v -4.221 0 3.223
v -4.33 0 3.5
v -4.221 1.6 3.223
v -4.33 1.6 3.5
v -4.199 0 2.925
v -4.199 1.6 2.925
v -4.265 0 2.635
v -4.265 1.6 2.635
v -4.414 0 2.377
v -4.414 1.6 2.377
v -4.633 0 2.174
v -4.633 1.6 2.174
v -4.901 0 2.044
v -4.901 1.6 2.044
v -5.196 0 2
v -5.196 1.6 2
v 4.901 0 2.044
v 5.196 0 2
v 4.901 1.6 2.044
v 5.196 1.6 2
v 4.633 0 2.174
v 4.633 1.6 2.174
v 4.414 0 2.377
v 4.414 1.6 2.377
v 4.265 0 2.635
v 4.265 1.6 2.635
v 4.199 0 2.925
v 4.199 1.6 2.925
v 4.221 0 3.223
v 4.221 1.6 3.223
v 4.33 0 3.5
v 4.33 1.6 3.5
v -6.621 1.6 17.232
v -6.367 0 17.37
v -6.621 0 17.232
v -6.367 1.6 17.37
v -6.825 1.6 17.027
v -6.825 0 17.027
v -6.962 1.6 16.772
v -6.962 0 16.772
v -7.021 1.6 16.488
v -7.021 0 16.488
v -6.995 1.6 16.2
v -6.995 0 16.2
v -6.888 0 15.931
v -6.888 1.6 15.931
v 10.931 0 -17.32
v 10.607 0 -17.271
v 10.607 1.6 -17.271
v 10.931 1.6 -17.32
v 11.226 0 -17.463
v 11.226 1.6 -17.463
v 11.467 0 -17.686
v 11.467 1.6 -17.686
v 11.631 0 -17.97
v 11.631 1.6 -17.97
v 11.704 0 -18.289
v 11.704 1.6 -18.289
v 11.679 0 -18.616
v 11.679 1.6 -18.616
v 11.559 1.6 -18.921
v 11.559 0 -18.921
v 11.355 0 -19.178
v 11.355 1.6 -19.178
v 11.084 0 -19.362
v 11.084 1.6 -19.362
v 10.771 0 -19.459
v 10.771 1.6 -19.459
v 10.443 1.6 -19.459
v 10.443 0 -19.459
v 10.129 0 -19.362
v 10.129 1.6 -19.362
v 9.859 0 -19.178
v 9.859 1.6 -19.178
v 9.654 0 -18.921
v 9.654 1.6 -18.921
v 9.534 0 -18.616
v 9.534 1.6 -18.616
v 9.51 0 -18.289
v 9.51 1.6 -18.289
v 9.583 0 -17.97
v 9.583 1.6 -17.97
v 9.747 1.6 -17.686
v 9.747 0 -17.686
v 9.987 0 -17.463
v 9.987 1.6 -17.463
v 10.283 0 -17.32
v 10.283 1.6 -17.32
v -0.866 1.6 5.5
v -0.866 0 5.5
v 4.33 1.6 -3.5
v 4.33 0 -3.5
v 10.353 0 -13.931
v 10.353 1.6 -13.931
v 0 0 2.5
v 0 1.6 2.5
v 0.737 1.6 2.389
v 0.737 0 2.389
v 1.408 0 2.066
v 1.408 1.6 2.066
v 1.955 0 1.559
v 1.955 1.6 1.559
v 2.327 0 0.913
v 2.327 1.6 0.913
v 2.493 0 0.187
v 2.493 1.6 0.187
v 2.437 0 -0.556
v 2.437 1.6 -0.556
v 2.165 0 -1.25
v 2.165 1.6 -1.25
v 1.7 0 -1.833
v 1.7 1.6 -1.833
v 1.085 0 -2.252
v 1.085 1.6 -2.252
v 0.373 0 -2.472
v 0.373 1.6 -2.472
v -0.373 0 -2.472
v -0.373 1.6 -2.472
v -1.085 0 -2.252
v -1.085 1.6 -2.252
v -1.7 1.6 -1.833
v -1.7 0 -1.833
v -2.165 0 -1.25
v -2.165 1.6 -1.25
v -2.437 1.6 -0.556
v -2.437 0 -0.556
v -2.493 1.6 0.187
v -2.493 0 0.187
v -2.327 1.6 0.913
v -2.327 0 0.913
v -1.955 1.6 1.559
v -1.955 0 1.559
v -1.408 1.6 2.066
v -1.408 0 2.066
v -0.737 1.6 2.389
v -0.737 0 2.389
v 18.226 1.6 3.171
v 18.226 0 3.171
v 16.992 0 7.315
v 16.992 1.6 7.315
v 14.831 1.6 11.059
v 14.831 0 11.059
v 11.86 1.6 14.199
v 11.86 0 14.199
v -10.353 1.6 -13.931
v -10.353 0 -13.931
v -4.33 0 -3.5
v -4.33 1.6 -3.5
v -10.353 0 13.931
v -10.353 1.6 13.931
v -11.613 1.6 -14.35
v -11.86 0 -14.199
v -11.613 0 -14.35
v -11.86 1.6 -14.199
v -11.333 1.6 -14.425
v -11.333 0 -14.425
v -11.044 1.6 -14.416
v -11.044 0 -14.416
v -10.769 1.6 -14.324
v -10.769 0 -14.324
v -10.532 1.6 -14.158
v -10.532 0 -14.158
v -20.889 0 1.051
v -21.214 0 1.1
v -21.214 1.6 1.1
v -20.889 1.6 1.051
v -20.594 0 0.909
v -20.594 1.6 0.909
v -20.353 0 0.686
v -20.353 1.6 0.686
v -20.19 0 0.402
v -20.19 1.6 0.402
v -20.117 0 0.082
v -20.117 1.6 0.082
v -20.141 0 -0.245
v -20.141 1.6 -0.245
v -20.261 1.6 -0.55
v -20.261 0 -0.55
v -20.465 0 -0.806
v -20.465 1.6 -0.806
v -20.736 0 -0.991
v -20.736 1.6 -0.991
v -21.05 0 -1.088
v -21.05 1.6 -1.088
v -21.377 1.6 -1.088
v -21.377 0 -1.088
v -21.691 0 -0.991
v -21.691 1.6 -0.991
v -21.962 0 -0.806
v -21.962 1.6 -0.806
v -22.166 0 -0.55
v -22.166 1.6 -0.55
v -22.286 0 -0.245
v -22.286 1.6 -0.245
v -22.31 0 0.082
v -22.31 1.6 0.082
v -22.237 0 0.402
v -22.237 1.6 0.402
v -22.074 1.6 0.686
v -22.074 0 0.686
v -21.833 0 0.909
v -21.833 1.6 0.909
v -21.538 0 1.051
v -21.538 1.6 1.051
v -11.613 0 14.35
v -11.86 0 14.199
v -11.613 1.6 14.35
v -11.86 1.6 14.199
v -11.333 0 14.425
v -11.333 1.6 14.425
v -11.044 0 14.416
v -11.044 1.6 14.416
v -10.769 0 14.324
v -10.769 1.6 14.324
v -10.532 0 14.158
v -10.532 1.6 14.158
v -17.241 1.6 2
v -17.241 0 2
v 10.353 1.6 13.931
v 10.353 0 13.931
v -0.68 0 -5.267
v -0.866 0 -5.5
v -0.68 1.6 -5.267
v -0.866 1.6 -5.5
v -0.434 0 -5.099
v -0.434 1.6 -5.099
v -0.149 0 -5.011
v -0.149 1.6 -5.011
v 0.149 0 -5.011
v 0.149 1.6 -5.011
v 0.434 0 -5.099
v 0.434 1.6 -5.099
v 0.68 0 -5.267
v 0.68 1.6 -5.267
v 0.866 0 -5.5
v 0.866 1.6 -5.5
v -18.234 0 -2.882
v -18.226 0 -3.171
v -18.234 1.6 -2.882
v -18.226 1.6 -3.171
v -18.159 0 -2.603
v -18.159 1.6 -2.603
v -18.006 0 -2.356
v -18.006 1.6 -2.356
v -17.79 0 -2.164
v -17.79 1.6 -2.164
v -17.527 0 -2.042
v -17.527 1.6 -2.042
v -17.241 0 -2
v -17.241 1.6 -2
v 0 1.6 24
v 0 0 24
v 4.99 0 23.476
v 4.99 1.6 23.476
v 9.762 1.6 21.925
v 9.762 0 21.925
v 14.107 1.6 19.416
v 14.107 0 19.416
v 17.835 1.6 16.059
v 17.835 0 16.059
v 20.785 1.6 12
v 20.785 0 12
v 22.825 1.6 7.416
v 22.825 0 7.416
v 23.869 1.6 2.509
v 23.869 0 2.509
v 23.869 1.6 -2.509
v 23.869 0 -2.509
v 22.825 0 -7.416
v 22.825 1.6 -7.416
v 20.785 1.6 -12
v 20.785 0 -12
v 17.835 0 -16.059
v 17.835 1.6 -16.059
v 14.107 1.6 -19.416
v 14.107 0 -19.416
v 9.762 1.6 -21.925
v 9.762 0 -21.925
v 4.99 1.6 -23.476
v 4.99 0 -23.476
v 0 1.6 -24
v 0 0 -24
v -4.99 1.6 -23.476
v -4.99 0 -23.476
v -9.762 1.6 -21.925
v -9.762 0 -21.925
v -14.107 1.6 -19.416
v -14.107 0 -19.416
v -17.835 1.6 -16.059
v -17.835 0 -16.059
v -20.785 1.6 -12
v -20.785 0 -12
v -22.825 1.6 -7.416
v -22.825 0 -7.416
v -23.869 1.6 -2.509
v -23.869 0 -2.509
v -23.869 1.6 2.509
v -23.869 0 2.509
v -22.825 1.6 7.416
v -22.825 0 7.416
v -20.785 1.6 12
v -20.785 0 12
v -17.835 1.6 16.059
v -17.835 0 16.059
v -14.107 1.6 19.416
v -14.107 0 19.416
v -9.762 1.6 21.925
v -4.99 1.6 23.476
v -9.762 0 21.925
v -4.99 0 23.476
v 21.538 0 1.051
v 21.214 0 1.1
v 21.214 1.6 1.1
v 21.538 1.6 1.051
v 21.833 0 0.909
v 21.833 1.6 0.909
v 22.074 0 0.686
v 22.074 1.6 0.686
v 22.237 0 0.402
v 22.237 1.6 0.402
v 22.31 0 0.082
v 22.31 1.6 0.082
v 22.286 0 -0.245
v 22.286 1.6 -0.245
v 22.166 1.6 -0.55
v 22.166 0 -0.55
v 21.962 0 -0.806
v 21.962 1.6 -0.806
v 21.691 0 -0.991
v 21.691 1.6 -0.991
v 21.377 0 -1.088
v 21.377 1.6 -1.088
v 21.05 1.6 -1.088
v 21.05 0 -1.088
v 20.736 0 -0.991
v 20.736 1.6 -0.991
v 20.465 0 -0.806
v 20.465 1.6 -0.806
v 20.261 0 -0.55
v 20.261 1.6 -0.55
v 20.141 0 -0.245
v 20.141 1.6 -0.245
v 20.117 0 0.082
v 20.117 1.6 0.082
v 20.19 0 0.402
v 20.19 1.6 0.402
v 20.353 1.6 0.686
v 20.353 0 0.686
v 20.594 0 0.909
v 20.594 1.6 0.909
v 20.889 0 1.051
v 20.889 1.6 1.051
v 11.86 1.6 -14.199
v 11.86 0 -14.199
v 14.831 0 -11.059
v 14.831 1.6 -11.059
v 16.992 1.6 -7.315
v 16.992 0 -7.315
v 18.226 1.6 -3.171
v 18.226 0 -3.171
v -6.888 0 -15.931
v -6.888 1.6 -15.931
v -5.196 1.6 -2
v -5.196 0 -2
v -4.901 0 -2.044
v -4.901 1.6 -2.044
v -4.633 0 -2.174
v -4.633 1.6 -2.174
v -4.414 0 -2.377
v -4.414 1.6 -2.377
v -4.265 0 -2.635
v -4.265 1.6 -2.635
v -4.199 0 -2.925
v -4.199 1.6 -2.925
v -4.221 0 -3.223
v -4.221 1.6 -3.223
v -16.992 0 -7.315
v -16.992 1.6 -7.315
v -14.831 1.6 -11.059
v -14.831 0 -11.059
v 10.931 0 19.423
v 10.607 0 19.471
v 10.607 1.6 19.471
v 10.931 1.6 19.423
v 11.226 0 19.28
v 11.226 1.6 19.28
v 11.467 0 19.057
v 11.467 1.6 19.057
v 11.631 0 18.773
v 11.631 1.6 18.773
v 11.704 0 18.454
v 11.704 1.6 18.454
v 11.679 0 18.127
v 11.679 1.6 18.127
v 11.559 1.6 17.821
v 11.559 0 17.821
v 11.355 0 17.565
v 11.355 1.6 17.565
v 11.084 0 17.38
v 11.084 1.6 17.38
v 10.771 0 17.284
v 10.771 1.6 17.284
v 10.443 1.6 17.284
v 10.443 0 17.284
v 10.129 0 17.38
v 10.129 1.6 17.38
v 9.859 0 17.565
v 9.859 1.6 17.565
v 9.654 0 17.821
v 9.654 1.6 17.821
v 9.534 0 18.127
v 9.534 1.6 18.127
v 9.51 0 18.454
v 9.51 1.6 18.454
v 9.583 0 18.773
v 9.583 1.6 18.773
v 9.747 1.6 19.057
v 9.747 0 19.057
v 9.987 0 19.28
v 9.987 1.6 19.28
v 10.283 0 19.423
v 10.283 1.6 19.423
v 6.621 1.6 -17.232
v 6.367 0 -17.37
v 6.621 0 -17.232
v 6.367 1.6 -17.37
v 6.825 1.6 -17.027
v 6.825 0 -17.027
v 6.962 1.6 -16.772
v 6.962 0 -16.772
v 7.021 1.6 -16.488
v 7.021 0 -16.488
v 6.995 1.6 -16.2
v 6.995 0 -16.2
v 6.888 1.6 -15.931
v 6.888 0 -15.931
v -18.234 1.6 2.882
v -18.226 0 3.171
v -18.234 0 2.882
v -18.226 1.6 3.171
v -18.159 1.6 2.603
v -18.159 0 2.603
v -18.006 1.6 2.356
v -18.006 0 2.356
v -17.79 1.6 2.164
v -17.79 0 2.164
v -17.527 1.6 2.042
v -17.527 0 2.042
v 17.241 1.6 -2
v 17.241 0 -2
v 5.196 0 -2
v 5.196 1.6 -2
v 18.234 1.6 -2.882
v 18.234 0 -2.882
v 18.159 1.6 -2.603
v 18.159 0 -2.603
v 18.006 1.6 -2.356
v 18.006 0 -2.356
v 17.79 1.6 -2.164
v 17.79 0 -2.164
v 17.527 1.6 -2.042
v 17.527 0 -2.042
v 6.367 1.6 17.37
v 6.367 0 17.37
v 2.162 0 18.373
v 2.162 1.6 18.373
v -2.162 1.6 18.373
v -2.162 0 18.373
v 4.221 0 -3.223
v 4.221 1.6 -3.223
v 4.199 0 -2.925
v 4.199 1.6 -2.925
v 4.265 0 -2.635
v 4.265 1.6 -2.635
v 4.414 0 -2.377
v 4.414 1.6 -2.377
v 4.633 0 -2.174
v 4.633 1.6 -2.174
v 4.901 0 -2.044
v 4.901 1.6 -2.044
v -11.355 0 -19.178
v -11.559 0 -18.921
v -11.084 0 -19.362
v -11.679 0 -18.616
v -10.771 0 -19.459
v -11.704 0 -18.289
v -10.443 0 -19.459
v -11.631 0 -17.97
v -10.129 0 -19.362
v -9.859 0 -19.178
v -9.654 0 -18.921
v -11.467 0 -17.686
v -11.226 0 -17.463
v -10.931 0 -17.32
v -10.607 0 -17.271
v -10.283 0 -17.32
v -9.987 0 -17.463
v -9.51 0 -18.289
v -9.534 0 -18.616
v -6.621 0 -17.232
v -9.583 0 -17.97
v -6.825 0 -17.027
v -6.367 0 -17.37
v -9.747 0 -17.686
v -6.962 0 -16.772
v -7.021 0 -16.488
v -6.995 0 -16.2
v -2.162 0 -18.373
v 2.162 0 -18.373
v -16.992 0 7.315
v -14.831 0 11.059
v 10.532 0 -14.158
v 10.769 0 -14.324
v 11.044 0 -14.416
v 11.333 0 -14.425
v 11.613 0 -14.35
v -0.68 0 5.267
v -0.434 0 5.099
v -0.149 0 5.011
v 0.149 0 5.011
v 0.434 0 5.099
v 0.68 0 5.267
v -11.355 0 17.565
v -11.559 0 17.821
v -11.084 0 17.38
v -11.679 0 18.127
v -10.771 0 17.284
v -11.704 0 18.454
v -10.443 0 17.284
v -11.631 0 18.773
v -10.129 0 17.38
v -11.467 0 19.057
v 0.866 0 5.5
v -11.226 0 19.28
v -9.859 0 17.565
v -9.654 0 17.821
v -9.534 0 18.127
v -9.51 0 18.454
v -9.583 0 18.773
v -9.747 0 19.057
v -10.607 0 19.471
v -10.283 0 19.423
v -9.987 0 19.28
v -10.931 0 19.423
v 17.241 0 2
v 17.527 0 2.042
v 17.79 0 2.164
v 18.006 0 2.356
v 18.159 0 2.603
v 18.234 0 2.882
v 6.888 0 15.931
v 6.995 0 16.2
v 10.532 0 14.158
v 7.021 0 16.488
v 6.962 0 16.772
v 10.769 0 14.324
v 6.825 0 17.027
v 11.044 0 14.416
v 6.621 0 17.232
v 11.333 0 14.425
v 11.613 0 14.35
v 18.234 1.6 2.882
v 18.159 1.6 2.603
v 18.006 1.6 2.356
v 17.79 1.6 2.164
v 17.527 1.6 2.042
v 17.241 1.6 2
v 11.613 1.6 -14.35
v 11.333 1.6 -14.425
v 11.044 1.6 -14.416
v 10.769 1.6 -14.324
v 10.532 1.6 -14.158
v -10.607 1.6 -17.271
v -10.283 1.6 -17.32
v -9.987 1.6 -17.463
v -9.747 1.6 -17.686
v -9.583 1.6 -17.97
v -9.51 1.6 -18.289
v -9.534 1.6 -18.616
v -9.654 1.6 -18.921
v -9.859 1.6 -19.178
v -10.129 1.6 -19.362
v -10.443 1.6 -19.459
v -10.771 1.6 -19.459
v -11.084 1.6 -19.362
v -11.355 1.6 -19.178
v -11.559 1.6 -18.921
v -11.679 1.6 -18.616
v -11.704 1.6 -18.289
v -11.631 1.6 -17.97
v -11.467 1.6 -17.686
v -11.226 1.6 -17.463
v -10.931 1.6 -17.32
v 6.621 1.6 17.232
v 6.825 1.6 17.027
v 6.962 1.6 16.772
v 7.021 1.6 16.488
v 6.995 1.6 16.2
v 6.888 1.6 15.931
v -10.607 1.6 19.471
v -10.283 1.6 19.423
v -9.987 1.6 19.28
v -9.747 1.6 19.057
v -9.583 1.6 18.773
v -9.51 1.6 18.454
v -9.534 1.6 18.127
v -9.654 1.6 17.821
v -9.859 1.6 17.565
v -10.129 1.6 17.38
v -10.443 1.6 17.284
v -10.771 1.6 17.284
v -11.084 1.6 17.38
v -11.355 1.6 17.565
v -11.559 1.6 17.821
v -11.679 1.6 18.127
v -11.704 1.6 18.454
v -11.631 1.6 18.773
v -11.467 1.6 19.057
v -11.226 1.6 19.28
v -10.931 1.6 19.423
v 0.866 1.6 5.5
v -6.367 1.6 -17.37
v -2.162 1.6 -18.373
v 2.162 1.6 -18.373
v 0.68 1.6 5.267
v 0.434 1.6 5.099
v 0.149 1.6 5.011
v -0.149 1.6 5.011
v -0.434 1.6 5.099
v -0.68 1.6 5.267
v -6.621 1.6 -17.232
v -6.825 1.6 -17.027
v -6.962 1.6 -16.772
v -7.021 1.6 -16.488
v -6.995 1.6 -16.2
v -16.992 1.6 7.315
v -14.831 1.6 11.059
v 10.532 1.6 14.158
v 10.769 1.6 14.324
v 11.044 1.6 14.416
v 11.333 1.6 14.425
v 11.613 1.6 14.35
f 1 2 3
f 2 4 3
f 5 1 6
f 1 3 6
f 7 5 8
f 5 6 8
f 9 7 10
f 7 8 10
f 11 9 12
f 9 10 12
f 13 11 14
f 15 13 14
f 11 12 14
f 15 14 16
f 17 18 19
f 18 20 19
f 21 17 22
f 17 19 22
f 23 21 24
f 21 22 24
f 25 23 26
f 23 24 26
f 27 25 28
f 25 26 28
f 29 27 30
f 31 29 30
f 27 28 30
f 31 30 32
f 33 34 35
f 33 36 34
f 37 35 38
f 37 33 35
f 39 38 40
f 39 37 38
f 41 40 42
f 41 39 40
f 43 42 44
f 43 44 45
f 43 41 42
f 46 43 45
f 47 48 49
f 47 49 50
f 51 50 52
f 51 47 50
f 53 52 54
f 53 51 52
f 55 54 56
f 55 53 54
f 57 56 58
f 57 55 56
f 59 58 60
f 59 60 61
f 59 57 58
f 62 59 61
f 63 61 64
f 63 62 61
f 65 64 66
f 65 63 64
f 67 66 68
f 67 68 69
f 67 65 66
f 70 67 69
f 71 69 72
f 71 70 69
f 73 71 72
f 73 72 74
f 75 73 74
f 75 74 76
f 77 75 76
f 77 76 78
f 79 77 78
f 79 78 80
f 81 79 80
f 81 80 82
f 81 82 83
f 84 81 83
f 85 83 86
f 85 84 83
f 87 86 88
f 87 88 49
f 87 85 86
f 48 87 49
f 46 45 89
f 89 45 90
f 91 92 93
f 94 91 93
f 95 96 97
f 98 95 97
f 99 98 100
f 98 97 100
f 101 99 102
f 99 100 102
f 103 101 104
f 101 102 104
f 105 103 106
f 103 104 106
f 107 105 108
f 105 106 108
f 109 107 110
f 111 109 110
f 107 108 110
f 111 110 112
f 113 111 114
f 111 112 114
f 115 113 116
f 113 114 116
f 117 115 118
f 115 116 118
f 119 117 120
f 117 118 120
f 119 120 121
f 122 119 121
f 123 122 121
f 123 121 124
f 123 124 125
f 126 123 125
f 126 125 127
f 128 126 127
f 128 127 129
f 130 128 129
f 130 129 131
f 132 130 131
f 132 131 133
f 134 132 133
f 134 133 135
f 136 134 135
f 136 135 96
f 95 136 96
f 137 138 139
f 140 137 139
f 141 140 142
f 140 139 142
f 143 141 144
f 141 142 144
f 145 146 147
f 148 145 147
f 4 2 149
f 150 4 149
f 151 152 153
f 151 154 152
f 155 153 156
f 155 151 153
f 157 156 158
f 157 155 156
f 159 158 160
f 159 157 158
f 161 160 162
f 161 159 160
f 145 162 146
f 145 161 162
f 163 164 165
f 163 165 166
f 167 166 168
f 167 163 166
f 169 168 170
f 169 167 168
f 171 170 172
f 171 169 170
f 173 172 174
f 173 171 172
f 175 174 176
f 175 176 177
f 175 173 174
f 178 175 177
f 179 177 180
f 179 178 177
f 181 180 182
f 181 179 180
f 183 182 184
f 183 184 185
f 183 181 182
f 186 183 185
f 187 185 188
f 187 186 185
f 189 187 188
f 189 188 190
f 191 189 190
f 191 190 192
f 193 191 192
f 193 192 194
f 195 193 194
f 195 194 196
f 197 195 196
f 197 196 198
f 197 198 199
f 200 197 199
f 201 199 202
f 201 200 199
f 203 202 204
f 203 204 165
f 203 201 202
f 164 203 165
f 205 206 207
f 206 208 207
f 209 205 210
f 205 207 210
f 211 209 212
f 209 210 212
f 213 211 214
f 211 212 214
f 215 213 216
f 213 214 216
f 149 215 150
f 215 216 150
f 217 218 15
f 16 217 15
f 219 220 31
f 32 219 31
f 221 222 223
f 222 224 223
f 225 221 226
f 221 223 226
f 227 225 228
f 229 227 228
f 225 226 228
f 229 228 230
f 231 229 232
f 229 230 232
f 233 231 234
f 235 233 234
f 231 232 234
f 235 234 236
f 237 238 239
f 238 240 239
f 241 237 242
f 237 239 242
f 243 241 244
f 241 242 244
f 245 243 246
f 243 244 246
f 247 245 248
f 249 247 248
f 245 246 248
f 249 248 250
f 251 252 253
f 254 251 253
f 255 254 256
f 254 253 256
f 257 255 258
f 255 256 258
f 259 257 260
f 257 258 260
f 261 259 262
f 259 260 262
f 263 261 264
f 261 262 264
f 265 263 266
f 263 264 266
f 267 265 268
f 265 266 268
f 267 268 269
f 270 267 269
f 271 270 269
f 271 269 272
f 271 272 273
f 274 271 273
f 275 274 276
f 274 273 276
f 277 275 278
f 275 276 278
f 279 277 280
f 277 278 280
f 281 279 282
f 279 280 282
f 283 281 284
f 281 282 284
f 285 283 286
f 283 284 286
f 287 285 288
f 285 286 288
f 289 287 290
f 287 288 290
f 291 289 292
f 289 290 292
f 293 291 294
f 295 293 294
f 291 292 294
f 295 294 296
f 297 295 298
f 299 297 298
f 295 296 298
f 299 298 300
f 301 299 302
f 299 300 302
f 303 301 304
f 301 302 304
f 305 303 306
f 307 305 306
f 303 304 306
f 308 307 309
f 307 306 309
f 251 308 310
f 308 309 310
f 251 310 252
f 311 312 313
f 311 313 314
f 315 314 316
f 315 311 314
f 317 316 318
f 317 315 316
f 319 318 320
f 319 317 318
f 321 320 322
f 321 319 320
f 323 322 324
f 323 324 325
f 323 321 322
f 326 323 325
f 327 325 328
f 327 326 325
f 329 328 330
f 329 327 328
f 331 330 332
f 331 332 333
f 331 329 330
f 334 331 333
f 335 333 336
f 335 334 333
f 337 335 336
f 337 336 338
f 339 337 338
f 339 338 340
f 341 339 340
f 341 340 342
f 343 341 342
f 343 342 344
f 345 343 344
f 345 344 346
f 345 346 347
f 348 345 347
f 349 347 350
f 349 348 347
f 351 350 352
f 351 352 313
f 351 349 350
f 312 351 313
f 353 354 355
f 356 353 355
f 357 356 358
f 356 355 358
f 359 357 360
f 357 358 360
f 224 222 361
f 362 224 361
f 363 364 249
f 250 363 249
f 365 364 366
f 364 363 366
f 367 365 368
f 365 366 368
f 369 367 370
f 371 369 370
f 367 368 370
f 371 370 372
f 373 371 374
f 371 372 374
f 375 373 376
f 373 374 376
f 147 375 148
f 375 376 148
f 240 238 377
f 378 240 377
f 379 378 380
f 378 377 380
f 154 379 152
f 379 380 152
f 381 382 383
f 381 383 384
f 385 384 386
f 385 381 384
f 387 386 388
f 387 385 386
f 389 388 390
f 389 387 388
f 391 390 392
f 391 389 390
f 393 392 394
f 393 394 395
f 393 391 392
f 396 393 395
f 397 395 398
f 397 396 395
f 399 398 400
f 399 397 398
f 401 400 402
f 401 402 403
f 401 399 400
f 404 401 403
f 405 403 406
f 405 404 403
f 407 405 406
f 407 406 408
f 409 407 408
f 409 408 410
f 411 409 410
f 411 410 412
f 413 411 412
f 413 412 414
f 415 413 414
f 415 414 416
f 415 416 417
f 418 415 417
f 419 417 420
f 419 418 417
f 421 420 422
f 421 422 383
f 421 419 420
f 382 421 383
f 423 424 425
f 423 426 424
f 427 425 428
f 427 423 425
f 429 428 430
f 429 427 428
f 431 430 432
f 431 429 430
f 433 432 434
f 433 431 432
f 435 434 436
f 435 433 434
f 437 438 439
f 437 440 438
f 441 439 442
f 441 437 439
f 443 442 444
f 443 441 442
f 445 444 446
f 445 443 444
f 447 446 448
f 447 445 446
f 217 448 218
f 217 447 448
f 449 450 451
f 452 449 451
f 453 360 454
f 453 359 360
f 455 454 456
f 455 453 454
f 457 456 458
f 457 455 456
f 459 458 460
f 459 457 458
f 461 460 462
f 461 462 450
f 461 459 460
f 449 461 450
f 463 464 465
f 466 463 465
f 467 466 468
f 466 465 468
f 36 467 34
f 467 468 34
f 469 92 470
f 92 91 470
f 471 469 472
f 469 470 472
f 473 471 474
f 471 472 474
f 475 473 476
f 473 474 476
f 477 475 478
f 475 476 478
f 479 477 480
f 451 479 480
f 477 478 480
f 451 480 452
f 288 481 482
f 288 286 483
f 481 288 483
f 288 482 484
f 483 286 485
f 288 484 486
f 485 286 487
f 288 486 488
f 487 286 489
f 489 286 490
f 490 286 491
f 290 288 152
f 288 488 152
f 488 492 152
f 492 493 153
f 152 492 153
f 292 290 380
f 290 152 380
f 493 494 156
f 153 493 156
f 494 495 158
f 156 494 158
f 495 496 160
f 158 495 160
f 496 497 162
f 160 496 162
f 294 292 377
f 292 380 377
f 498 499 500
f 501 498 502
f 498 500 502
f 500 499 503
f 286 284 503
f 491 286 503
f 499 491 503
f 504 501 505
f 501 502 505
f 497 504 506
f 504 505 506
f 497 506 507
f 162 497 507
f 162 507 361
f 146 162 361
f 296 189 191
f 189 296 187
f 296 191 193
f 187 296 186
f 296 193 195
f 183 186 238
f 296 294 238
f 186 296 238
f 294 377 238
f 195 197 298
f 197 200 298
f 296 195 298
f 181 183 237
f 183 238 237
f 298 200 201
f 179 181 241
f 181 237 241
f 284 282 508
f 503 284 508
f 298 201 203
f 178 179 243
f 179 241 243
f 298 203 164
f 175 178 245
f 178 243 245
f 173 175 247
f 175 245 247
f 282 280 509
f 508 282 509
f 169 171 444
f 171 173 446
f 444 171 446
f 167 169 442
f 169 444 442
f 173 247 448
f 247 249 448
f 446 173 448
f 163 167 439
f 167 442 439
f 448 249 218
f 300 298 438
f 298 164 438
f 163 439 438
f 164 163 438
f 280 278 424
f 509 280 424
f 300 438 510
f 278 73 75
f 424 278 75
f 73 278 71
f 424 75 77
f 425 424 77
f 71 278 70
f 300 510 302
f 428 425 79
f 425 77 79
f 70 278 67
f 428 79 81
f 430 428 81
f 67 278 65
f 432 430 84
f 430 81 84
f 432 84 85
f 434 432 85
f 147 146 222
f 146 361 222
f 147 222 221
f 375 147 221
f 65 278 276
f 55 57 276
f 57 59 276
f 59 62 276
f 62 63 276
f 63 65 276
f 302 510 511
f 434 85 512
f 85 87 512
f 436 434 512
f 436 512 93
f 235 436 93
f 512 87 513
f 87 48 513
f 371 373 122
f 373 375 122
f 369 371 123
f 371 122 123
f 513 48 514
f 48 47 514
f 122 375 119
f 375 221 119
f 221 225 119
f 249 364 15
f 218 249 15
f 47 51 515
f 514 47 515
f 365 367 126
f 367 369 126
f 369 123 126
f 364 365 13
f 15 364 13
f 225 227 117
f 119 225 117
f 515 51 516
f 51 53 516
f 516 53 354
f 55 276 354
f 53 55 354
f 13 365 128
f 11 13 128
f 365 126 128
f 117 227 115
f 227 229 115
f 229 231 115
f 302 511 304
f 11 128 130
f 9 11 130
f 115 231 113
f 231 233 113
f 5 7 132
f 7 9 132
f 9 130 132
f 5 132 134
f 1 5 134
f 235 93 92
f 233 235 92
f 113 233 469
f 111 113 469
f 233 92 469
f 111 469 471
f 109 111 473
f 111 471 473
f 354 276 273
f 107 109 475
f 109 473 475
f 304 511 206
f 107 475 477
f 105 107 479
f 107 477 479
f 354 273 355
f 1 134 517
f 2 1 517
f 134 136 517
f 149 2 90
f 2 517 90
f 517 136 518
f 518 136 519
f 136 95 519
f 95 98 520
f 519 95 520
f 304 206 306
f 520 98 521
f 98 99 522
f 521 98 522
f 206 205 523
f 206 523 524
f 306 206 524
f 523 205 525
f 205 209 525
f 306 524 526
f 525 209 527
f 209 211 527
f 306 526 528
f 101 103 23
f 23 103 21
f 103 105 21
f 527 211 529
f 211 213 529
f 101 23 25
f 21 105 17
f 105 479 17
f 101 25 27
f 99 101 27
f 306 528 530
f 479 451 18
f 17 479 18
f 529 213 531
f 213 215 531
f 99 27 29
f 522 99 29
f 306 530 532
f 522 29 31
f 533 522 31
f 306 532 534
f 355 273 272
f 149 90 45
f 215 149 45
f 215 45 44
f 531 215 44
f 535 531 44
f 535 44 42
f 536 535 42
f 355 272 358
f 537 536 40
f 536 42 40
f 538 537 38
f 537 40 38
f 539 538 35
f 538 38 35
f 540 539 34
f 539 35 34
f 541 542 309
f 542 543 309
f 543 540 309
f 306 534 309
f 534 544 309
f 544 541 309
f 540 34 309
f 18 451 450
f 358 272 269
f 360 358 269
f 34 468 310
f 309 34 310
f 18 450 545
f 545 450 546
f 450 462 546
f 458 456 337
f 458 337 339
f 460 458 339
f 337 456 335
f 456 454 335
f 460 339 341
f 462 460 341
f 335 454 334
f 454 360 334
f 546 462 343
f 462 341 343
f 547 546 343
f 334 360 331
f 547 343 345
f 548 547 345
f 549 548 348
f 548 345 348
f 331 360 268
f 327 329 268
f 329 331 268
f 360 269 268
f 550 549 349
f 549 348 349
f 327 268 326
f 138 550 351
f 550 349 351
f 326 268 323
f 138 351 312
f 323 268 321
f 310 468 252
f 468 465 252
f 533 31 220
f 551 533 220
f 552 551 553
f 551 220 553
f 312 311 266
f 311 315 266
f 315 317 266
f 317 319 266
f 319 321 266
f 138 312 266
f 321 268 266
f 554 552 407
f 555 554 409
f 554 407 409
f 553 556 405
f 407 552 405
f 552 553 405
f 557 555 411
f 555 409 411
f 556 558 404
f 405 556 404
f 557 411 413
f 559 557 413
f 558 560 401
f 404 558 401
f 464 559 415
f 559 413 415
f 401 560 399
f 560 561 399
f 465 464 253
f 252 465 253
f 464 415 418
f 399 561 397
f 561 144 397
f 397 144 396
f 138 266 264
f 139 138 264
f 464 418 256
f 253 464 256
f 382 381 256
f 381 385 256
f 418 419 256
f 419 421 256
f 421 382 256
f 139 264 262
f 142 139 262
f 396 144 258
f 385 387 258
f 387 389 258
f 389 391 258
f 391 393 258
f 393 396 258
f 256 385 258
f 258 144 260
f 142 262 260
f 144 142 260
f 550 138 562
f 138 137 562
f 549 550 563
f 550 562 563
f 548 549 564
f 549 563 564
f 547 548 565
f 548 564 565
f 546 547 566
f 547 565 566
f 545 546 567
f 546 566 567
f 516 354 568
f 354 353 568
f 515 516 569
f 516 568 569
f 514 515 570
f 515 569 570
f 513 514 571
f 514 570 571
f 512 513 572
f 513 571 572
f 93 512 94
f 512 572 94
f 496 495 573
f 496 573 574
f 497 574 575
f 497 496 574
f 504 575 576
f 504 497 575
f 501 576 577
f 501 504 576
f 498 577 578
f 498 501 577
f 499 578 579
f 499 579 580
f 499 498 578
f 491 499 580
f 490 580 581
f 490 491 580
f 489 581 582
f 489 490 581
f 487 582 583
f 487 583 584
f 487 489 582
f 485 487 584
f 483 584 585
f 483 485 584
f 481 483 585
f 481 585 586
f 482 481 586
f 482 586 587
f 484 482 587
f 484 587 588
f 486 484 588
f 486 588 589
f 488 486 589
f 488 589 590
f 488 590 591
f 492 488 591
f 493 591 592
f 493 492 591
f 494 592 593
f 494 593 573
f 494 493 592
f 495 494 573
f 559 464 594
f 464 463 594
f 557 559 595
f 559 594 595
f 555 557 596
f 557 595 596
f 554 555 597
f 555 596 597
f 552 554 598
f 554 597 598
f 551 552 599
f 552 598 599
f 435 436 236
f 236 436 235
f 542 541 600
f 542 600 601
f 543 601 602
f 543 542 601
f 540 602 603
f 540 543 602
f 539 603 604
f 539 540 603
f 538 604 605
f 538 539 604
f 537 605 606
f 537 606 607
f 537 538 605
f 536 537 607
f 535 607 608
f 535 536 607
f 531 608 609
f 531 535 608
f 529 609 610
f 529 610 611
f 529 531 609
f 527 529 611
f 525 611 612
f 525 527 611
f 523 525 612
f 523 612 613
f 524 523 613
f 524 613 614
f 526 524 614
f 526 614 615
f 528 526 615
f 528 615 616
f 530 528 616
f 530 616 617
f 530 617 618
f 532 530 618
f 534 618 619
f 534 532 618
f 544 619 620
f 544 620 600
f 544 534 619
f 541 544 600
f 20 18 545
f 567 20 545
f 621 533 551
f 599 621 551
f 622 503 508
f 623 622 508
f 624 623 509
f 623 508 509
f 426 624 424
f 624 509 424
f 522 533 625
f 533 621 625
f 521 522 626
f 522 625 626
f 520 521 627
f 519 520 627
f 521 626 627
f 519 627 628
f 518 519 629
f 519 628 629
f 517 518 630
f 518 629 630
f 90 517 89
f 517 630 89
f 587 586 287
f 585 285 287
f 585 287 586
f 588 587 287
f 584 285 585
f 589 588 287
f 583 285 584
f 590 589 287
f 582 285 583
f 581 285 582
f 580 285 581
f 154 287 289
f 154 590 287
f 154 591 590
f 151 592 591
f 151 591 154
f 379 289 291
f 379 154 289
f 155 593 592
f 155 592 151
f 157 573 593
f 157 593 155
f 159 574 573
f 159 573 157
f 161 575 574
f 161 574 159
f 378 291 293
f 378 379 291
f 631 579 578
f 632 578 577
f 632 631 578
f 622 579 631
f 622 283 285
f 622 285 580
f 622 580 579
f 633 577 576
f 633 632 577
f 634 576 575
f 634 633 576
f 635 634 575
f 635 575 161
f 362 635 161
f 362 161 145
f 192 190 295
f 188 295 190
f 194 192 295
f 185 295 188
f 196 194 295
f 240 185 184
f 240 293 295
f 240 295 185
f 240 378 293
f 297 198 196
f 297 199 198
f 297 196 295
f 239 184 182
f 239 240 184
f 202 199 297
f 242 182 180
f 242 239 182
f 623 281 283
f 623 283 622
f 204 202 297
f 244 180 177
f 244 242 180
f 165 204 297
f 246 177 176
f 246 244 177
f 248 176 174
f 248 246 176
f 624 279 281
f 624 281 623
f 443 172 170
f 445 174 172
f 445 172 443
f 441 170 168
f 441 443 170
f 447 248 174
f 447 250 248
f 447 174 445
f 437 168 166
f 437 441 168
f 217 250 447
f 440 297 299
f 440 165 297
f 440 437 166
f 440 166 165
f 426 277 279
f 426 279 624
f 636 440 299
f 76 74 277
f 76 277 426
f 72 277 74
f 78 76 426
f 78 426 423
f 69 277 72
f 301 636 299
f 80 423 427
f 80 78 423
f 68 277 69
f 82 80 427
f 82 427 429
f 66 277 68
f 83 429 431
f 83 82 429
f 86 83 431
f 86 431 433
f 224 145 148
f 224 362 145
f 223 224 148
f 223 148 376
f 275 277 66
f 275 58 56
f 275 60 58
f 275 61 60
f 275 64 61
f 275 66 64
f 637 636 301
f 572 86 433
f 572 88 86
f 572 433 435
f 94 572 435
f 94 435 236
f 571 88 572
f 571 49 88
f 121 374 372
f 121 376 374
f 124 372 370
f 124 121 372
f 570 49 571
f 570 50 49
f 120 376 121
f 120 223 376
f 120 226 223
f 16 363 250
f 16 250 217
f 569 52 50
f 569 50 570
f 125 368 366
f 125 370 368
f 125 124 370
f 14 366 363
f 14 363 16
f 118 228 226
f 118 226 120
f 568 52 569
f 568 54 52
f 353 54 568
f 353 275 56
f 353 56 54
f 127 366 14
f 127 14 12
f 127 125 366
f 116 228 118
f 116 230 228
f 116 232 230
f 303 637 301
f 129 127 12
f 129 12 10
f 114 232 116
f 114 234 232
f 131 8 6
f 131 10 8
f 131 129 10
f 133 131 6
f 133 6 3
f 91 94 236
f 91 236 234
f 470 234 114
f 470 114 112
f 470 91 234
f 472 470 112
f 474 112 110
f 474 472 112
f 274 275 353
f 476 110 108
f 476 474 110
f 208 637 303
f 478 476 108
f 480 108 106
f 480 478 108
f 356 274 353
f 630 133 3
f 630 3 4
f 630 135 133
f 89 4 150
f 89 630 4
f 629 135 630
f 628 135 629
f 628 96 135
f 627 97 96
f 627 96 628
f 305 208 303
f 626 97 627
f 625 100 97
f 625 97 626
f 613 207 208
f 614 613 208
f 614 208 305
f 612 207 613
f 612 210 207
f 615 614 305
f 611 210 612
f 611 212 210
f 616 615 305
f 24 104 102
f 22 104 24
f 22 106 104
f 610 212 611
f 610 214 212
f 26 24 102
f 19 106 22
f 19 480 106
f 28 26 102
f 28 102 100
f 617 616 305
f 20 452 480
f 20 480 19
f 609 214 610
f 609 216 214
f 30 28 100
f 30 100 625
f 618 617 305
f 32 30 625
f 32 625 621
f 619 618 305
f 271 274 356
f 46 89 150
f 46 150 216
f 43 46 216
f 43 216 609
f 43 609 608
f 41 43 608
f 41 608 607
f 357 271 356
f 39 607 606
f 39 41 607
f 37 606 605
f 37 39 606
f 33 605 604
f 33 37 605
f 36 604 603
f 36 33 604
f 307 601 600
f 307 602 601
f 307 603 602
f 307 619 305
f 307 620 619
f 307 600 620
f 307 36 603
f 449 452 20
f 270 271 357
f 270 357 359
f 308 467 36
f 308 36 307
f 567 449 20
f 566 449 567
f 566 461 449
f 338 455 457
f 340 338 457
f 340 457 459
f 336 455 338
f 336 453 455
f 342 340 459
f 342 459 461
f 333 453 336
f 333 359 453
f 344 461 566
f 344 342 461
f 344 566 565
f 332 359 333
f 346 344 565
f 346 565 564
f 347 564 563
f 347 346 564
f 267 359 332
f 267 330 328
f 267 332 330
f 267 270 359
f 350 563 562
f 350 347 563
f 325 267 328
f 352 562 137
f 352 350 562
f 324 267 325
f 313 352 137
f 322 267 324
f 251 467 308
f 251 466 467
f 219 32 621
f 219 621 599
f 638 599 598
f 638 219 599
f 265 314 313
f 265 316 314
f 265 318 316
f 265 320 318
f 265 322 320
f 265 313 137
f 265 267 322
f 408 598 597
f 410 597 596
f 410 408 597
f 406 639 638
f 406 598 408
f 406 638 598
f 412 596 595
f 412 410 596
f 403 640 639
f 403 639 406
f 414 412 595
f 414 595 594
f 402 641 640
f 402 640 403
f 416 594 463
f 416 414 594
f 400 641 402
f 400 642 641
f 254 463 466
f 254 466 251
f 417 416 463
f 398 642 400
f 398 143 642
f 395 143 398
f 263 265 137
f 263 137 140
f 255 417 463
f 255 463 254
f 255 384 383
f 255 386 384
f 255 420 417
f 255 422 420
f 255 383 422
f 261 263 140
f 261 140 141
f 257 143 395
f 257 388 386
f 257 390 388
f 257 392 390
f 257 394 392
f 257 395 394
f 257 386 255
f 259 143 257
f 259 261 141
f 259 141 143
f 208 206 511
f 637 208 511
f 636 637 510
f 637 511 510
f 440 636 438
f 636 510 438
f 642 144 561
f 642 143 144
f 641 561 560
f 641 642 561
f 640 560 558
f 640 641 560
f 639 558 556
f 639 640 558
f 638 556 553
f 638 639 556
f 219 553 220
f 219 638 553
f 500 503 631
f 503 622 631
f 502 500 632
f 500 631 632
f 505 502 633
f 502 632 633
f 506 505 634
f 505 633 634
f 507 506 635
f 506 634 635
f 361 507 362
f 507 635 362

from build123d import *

# Parameters (mm, degrees)
SKETCH1_R           = 24
SKETCH1_R_2         = 1.1
BOSS_EXTRUDE1_DEPTH = 1.6
FILLET1_R           = 1
SKETCH2_R           = 2.5
CUT_EXTRUDE1_DEPTH  = 34.978816931


with BuildPart() as part:
    # Sketch1 → Boss-Extrude1 (new body)
    with BuildSketch(Plane(origin=(0, 0, 0), x_dir=(1, 0, 0), z_dir=(0, 1, 0))):
        with Locations(Location((0, 0, 0), (0, 0, 270))):
            Circle(SKETCH1_R)
        with BuildLine():
            Line((-7.463736271, -16.927570436), (0, -4))
            Line((0, -4), (7.463736271, -16.927570436))
            ThreePointArc((7.463736271, -16.927570436), (0, -18.5), (-7.463736271, -16.927570436))
        make_face(mode=Mode.SUBTRACT)
        with BuildLine():
            Line((10.927837886, -14.927570436), (3.464101615, -2))
            Line((3.464101615, -2), (18.391574158, -2))
            ThreePointArc((18.391574158, -2), (16.02146997, -9.25), (10.927837886, -14.927570436))
        make_face(mode=Mode.SUBTRACT)
        with BuildLine():
            Line((18.391574158, 2), (3.464101615, 2))
            Line((3.464101615, 2), (10.927837886, 14.927570436))
            ThreePointArc((10.927837886, 14.927570436), (16.02146997, 9.25), (18.391574158, 2))
        make_face(mode=Mode.SUBTRACT)
        with BuildLine():
            Line((7.463736271, 16.927570436), (0, 4))
            Line((0, 4), (-7.463736271, 16.927570436))
            ThreePointArc((-7.463736271, 16.927570436), (0, 18.5), (7.463736271, 16.927570436))
        make_face(mode=Mode.SUBTRACT)
        with BuildLine():
            Line((-10.927837886, 14.927570436), (-3.464101615, 2))
            Line((-3.464101615, 2), (-18.391574158, 2))
            ThreePointArc((-18.391574158, 2), (-16.02146997, 9.25), (-10.927837886, 14.927570436))
        make_face(mode=Mode.SUBTRACT)
        with BuildLine():
            Line((-18.391574158, -2), (-3.464101615, -2))
            Line((-3.464101615, -2), (-10.927837886, -14.927570436))
            ThreePointArc((-10.927837886, -14.927570436), (-16.02146997, -9.25), (-18.391574158, -2))
        make_face(mode=Mode.SUBTRACT)
        with Locations(Location((-10.60675, -18.371429903, 0), (0, 0, 270))):
            Circle(SKETCH1_R_2, mode=Mode.SUBTRACT)
        with Locations(Location((-21.2135, 0, 0), (0, 0, 270))):
            Circle(SKETCH1_R_2, mode=Mode.SUBTRACT)
        with Locations(Location((10.60675, -18.371429903, 0), (0, 0, 270))):
            Circle(SKETCH1_R_2, mode=Mode.SUBTRACT)
        with Locations(Location((21.2135, 0, 0), (0, 0, 270))):
            Circle(SKETCH1_R_2, mode=Mode.SUBTRACT)
        with Locations(Location((-10.60675, 18.371429903, 0), (0, 0, 270))):
            Circle(SKETCH1_R_2, mode=Mode.SUBTRACT)
        with Locations(Location((10.60675, 18.371429903, 0), (0, 0, 270))):
            Circle(SKETCH1_R_2, mode=Mode.SUBTRACT)
    extrude(amount=BOSS_EXTRUDE1_DEPTH)

    # Fillet1
    fillet1_edges = [part.edges().sort_by_distance(p)[0] for p in [
        (-3.464101615, 0.8, 2),
        (-18.391574158, 0.8, 2),
        (-10.927837886, 0.8, 14.927570436),
        (-18.391574158, 0.8, -2),
        (-3.464101615, 0.8, -2),
        (-10.927837886, 0.8, -14.927570436),
        (-7.463736271, 0.8, 16.927570436),
        (7.463736271, 0.8, 16.927570436),
        (0, 0.8, 4),
        (10.927837886, 0.8, 14.927570436),
        (18.391574158, 0.8, 2),
        (3.464101615, 0.8, 2),
        (18.391574158, 0.8, -2),
        (10.927837886, 0.8, -14.927570436),
        (3.464101615, 0.8, -2),
        (7.463736271, 0.8, -16.927570436),
        (-7.463736271, 0.8, -16.927570436),
        (0, 0.8, -4),
    ]]
    fillet(fillet1_edges, radius=FILLET1_R)

    # Sketch2 → Cut-Extrude1 (cut, through all)
    with BuildSketch(Plane(origin=(0, 1.6, 0), x_dir=(1, 0, 0), z_dir=(0, 1, 0))):
        with Locations(Location((0, 0, 0), (0, 0, 270))):
            Circle(SKETCH2_R)
    extrude(amount=-CUT_EXTRUDE1_DEPTH, mode=Mode.SUBTRACT)


solid = part.part
